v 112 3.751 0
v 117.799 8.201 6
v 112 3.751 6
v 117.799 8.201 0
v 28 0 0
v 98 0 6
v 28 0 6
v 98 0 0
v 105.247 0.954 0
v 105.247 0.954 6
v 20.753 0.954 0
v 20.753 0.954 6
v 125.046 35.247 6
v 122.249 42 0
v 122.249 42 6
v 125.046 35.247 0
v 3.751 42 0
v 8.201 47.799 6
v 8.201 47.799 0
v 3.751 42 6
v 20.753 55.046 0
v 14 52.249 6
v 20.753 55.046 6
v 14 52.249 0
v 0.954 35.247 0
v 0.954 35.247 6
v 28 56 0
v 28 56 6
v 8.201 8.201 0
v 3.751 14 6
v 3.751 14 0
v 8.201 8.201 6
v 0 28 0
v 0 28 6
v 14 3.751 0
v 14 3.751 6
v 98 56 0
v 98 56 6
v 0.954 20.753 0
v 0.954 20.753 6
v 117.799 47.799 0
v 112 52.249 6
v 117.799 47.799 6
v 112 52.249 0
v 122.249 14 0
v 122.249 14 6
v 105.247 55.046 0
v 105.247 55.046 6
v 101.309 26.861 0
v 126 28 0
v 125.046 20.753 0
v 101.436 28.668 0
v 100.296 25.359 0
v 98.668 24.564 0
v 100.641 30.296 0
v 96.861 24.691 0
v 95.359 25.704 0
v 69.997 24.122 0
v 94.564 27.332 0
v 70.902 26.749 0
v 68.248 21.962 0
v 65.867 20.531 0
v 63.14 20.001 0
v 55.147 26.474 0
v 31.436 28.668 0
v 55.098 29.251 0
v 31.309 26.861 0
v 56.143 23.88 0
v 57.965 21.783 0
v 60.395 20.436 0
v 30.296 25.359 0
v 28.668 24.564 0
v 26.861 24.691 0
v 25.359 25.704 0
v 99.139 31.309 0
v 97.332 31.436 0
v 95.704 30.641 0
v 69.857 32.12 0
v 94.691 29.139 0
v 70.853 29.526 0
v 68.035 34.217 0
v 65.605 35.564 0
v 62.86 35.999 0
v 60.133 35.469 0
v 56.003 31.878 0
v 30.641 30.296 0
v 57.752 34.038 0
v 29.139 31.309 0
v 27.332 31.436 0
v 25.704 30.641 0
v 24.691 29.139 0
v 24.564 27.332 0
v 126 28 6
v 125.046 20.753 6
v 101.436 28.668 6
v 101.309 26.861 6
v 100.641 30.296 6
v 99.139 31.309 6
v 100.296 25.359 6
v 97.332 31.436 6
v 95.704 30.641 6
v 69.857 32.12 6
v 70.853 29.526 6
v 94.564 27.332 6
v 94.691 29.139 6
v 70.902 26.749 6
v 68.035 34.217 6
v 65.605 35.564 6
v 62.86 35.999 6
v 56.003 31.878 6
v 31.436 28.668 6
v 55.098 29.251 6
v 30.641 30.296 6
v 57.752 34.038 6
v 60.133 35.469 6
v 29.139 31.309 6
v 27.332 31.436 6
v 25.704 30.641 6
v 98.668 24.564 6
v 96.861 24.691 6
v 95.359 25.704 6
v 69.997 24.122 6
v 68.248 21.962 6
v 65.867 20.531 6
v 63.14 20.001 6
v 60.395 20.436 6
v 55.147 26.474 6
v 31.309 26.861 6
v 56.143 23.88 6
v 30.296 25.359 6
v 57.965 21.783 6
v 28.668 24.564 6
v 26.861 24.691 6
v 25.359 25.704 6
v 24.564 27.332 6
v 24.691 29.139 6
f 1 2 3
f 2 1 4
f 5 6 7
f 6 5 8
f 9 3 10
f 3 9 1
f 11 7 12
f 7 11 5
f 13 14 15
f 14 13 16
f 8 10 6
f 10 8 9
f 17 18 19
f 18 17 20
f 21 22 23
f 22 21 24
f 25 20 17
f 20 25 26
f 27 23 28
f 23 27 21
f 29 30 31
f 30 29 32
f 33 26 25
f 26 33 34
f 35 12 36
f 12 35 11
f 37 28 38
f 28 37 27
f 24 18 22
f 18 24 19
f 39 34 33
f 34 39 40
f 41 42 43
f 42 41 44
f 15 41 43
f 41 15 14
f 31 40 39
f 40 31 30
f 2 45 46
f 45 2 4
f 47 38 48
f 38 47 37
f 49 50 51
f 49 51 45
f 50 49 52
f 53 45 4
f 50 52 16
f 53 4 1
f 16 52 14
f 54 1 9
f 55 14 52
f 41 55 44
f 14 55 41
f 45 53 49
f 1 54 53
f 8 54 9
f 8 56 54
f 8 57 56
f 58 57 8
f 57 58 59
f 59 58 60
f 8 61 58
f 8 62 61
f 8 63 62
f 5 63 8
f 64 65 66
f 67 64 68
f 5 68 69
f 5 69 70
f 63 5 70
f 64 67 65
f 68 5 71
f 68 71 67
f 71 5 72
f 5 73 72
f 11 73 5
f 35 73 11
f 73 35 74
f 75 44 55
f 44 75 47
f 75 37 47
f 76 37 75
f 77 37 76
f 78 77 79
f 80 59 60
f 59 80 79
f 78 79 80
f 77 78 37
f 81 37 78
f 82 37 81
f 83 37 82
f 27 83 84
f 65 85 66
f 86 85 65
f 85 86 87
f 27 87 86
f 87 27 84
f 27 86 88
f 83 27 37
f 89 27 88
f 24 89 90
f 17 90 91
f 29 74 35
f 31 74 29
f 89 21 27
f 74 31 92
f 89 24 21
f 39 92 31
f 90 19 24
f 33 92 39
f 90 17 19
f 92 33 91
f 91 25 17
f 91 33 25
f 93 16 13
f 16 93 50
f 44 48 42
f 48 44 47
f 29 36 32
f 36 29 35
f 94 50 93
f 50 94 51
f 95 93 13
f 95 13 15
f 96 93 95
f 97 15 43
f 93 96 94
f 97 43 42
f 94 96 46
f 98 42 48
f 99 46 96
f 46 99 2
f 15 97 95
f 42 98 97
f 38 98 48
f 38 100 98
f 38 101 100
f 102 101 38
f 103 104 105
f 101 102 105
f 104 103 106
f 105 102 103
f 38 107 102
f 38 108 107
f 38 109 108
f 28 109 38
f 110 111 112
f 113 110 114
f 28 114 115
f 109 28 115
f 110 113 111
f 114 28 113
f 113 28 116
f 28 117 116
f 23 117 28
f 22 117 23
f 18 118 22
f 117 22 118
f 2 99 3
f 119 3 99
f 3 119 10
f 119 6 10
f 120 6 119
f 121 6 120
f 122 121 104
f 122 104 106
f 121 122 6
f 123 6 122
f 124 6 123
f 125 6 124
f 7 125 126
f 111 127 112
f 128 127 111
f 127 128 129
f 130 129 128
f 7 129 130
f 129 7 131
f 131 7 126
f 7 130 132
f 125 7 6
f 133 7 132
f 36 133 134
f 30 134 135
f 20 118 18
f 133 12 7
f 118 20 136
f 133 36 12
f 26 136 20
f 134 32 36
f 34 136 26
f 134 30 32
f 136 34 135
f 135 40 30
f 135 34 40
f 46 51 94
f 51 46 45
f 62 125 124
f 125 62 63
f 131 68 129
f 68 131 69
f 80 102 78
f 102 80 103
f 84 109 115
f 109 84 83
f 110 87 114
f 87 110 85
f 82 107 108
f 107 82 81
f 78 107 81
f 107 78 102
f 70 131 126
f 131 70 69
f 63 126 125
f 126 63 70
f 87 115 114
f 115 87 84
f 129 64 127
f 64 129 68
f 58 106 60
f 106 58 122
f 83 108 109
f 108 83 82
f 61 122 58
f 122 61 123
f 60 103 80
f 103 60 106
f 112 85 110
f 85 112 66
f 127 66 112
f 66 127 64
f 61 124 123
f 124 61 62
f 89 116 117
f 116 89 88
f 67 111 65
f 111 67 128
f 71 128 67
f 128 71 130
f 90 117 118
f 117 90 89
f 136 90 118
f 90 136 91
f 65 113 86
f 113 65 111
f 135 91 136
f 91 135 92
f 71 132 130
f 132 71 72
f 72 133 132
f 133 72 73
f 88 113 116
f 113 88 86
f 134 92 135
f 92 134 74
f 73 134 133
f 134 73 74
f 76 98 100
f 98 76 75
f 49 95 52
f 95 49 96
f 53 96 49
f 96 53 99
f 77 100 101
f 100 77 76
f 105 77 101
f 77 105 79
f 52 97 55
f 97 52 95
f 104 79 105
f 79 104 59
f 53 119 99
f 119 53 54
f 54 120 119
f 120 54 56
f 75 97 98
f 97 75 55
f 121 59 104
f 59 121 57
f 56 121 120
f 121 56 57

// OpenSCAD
$fn = 32;

// ----------------------------------------------------------------------
// Spacer plate: obround span 70, caps R28
// ----------------------------------------------------------------------

// --- parameters (mm) ---
bore_r = 8;               // centre bore radius
bolt_r = 3.5;             // bolt hole radius
plate_t = 6;              // plate thickness, Z (extrusion height)
span = 70;                // obround span
cap_r = 28;               // cap radius
fit_tol = 0.05;           // declared fit tolerance (prompt contract)
free_tol = 0.3;           // declared free tolerance (prompt contract)

profile = [[28, 56], [20.753, 55.046], [14, 52.249], [8.201, 47.799], [3.751, 42], [0.954, 35.247], [0, 28], [0.954, 20.753], [3.751, 14], [8.201, 8.201], [14, 3.751], [20.753, 0.954], [28, 0], [98, 0], [105.247, 0.954], [112, 3.751], [117.799, 8.201], [122.249, 14], [125.046, 20.753], [126, 28], [125.046, 35.247], [122.249, 42], [117.799, 47.799], [112, 52.249], [105.247, 55.046], [98, 56]];  // primary outline, 26 points, counter clockwise
void_1 = [[70.853, 29.526], [69.857, 32.12], [68.035, 34.217], [65.605, 35.564], [62.86, 35.999], [60.133, 35.469], [57.752, 34.038], [56.003, 31.878], [55.098, 29.251], [55.147, 26.474], [56.143, 23.88], [57.965, 21.783], [60.395, 20.436], [63.14, 20.001], [65.867, 20.531], [68.248, 21.962], [69.997, 24.122], [70.902, 26.749]];  // centre bore, 18 points
void_2 = [[31.436, 28.668], [30.641, 30.296], [29.139, 31.309], [27.332, 31.436], [25.704, 30.641], [24.691, 29.139], [24.564, 27.332], [25.359, 25.704], [26.861, 24.691], [28.668, 24.564], [30.296, 25.359], [31.309, 26.861]];  // end hole, 12 points
void_3 = [[101.436, 28.668], [100.641, 30.296], [99.139, 31.309], [97.332, 31.436], [95.704, 30.641], [94.691, 29.139], [94.564, 27.332], [95.359, 25.704], [96.861, 24.691], [98.668, 24.564], [100.296, 25.359], [101.309, 26.861]];  // end hole, 12 points

// --- the one profile operation ---
difference() {
  linear_extrude(height = plate_t) polygon(points = profile);
  translate([0, 0, -1])
    linear_extrude(height = plate_t + 2) polygon(points = void_1);
  translate([0, 0, -1])
    linear_extrude(height = plate_t + 2) polygon(points = void_2);
  translate([0, 0, -1])
    linear_extrude(height = plate_t + 2) polygon(points = void_3);
}
